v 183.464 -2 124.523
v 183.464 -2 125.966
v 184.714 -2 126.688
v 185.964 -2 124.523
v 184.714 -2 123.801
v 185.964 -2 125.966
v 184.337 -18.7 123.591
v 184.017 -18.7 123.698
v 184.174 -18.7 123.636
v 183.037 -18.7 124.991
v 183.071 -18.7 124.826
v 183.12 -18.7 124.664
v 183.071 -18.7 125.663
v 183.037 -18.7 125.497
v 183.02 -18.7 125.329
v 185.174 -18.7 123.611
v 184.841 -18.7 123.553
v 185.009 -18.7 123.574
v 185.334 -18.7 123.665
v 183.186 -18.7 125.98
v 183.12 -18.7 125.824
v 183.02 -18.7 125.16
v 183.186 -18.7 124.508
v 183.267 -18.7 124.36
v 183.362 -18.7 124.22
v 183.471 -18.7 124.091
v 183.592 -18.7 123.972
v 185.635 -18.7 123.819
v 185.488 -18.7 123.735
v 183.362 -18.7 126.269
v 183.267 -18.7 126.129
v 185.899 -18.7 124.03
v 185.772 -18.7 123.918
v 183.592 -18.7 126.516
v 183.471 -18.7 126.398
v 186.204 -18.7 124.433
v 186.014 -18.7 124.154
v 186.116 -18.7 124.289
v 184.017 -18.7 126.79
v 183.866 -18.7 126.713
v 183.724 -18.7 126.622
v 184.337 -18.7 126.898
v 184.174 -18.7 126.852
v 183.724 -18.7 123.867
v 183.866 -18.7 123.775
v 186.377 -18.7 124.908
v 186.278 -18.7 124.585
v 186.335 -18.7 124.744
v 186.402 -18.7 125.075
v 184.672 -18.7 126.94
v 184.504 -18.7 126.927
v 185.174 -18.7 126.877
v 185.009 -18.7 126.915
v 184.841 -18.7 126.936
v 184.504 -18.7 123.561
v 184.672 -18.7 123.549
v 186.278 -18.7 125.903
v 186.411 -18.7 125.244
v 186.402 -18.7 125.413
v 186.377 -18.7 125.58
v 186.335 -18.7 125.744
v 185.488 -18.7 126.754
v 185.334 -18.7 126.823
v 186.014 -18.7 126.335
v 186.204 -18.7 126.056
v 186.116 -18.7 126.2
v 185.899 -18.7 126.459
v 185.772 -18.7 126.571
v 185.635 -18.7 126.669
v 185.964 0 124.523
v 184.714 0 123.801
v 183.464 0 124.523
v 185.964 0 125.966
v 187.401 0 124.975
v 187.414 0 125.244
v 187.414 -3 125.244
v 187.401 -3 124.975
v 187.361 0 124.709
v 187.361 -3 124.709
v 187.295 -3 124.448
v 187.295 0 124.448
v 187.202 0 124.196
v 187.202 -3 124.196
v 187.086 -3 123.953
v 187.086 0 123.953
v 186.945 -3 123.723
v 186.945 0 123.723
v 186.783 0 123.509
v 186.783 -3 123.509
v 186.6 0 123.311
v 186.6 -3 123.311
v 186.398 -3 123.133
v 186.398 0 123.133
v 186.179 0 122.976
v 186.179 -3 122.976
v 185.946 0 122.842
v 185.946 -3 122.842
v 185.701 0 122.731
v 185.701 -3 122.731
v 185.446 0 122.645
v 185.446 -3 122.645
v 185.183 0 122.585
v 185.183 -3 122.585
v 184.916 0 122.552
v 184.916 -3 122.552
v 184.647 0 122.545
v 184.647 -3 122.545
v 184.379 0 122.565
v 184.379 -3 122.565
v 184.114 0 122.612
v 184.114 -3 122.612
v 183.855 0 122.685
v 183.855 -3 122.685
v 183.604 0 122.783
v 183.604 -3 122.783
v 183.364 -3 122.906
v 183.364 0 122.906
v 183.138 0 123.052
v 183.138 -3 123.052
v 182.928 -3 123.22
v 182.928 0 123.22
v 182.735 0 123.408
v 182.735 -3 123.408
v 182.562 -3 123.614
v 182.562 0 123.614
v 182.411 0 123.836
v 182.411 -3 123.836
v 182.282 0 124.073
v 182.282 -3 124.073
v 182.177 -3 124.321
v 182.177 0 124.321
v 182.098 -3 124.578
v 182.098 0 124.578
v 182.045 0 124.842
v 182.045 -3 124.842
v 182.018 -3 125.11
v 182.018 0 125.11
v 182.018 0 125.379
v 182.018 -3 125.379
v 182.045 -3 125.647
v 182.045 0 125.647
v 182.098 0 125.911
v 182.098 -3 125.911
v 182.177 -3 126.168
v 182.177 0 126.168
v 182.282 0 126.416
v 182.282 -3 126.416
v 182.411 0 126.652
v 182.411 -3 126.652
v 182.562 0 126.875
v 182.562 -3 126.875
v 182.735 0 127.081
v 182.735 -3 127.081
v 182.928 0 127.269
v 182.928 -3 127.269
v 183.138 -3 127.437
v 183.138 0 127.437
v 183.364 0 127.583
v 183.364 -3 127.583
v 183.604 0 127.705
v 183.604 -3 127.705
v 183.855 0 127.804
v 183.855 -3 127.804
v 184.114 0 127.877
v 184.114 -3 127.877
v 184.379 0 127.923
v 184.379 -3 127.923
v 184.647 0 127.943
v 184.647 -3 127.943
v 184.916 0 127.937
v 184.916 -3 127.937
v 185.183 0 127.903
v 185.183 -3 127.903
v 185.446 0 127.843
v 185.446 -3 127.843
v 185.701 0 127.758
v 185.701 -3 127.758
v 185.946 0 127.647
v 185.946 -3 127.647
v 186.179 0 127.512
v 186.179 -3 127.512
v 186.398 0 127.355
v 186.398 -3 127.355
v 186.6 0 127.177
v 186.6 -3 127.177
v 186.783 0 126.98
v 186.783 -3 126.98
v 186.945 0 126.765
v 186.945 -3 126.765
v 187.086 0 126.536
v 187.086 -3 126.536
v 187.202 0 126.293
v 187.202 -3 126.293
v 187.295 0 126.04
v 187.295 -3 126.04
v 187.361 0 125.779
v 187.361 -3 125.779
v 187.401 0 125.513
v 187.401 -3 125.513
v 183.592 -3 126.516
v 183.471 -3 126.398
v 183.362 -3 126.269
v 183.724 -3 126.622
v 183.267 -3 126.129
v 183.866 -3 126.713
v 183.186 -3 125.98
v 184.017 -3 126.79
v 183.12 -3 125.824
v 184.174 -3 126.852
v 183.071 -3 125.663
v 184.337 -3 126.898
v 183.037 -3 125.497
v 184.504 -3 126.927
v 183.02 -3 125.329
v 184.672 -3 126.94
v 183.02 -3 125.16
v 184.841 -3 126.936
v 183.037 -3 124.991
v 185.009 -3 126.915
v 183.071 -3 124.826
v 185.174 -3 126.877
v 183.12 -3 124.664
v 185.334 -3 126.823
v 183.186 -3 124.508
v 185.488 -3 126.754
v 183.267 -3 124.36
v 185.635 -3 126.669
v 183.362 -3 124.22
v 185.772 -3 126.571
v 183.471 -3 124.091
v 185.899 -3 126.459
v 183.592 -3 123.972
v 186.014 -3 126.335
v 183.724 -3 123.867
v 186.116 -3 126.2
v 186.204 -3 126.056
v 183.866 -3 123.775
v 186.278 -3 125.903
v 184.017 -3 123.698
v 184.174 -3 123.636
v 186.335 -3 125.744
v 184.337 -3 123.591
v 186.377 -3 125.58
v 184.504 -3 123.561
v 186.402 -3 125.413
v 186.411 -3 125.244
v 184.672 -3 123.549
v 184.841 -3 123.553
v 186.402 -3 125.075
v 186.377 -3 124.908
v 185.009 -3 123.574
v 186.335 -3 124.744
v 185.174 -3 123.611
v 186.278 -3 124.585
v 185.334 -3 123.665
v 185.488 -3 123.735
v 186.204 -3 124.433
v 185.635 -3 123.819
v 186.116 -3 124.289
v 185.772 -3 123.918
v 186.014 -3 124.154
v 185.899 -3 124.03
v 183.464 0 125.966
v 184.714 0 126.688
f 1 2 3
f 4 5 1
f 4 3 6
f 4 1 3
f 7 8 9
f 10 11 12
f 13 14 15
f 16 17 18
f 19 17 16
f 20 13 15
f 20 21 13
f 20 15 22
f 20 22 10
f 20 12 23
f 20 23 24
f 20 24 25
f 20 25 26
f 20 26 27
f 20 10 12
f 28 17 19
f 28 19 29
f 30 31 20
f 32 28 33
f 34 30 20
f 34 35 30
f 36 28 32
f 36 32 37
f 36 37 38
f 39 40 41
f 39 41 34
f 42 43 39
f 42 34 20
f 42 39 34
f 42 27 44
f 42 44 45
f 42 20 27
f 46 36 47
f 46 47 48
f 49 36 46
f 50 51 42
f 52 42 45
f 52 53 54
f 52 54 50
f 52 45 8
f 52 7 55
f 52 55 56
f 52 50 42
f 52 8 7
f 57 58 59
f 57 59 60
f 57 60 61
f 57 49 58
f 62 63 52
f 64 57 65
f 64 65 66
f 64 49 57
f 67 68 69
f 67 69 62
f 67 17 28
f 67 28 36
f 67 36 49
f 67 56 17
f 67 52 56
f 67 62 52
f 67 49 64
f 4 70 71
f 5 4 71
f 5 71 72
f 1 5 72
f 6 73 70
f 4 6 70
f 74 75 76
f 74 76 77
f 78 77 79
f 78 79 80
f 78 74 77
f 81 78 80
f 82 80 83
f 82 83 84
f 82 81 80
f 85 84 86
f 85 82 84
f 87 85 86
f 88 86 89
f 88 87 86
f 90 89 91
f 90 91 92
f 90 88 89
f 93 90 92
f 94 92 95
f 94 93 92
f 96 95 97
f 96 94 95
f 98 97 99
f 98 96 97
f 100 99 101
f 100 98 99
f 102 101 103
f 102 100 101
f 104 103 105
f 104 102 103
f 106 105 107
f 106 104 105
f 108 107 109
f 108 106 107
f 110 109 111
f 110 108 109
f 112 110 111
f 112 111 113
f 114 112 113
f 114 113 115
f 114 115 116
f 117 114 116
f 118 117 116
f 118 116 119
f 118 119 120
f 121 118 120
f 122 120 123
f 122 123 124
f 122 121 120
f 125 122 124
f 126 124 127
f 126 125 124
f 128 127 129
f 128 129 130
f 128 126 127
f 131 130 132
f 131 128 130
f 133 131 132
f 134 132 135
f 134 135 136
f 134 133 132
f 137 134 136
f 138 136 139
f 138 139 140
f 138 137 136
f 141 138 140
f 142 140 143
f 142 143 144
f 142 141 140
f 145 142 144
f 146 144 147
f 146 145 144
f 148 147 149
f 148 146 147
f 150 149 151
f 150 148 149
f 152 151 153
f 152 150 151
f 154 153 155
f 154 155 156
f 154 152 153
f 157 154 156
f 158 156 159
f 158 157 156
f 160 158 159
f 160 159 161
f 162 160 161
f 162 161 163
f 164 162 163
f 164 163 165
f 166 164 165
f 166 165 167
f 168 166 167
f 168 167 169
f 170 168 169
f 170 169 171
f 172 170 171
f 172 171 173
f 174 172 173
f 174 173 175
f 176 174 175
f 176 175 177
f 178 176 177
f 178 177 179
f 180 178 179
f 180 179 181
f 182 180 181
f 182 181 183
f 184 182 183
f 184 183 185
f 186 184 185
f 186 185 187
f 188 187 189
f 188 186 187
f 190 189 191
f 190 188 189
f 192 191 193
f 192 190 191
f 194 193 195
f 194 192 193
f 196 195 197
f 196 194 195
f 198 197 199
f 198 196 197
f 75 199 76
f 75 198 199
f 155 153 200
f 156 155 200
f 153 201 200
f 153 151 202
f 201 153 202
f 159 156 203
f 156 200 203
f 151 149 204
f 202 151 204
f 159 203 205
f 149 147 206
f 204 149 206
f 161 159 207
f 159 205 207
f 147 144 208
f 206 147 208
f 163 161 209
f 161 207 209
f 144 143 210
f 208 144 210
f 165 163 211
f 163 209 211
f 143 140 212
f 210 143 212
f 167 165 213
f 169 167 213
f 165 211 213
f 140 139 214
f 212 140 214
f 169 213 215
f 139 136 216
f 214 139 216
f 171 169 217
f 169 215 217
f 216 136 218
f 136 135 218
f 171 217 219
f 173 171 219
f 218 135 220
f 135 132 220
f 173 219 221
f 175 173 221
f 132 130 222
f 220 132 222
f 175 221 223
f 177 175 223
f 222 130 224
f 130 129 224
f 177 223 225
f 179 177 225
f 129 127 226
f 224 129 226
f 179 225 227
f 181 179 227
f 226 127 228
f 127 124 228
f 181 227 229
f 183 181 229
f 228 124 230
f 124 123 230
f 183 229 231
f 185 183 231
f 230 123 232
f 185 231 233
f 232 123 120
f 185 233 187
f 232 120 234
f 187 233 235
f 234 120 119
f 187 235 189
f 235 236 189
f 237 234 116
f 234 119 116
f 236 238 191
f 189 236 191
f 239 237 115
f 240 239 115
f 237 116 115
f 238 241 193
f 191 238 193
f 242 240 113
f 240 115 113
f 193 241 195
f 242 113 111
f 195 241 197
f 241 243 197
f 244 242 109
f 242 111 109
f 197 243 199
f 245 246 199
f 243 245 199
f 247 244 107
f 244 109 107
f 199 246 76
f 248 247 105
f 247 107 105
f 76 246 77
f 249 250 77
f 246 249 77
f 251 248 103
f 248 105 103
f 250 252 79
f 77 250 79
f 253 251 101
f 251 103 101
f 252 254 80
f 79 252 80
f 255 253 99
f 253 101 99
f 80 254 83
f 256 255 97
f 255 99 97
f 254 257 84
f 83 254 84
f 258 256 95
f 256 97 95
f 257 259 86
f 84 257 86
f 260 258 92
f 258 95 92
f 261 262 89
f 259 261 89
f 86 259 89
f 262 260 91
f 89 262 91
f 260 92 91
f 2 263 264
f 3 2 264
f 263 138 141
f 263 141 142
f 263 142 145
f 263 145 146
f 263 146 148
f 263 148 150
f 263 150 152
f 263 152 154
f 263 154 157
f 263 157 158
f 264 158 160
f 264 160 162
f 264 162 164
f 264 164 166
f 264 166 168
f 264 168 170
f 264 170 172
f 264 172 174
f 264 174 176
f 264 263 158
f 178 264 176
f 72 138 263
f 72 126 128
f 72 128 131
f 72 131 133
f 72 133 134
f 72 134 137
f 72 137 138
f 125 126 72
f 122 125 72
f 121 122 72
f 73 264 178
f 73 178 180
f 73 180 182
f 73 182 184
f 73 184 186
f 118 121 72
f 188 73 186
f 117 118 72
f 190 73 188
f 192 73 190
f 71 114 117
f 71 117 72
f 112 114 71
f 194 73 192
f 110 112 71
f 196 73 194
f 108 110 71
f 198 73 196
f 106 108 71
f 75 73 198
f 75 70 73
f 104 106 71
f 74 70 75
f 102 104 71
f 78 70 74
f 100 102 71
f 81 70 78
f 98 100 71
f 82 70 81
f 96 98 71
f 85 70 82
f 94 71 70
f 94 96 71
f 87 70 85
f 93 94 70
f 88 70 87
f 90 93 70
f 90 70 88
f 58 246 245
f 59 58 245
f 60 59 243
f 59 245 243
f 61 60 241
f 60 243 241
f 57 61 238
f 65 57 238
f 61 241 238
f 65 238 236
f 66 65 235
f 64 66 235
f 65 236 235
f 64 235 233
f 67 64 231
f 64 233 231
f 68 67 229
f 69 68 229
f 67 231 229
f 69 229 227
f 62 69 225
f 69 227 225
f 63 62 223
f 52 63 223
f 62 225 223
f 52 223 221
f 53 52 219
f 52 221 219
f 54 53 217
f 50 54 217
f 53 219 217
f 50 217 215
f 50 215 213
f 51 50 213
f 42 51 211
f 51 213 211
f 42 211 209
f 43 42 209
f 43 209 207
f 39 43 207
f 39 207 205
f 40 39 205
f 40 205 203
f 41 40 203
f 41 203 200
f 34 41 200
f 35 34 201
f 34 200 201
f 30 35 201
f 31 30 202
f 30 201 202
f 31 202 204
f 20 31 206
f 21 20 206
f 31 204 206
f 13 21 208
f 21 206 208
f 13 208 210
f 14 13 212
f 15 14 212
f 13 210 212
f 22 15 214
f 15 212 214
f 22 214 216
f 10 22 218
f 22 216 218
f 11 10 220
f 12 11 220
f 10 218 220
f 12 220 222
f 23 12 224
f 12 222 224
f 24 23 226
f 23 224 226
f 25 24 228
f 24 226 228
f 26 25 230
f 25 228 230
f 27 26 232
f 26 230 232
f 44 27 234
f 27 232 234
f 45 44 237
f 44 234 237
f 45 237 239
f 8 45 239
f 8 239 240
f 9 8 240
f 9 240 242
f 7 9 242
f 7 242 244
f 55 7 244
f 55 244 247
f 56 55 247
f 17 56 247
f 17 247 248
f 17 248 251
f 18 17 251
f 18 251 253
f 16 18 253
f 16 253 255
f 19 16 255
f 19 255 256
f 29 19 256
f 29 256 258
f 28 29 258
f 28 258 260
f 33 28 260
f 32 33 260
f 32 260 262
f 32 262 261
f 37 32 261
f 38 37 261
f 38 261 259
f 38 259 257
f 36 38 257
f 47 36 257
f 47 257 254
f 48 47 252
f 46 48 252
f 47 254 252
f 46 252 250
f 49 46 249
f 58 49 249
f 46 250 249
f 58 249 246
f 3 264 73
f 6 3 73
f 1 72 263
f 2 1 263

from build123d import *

# Parameters (mm, degrees)
SKETCH1_R           = 2.7
BOSS_EXTRUDE1_DEPTH = 3
SKETCH2_R           = 1.696293742
BOSS_EXTRUDE2_DEPTH = 15.7
CUT_EXTRUDE1_DEPTH  = 2


with BuildPart() as part:
    # Sketch1 → Boss-Extrude1 (new body)
    with BuildSketch(Plane(origin=(0, 0, 0), x_dir=(1, 0, 0), z_dir=(0, 1, 0))):
        with Locations((184.714490272, -125.24429514)):
            Circle(SKETCH1_R)
    extrude(amount=-BOSS_EXTRUDE1_DEPTH)

    # Sketch2 → Boss-Extrude2 (add)
    with BuildSketch(Plane.XZ.offset(3)):
        with Locations((184.714490272, 125.24429514)):
            Circle(SKETCH2_R)
    extrude(amount=BOSS_EXTRUDE2_DEPTH)

    # Sketch3 → Cut-Extrude1 (cut)
    with BuildSketch(Plane(origin=(0, 0, 0), x_dir=(1, 0, 0), z_dir=(0, 1, 0))):
        Polygon((184.714490272, -123.800919467), (183.464490272, -124.522607304), (183.464490272, -125.965982977), (184.714490272, -126.687670813), (185.964490272, -125.965982977), (185.964490272, -124.522607304), align=None)
    extrude(amount=-CUT_EXTRUDE1_DEPTH, mode=Mode.SUBTRACT)


solid = part.part
